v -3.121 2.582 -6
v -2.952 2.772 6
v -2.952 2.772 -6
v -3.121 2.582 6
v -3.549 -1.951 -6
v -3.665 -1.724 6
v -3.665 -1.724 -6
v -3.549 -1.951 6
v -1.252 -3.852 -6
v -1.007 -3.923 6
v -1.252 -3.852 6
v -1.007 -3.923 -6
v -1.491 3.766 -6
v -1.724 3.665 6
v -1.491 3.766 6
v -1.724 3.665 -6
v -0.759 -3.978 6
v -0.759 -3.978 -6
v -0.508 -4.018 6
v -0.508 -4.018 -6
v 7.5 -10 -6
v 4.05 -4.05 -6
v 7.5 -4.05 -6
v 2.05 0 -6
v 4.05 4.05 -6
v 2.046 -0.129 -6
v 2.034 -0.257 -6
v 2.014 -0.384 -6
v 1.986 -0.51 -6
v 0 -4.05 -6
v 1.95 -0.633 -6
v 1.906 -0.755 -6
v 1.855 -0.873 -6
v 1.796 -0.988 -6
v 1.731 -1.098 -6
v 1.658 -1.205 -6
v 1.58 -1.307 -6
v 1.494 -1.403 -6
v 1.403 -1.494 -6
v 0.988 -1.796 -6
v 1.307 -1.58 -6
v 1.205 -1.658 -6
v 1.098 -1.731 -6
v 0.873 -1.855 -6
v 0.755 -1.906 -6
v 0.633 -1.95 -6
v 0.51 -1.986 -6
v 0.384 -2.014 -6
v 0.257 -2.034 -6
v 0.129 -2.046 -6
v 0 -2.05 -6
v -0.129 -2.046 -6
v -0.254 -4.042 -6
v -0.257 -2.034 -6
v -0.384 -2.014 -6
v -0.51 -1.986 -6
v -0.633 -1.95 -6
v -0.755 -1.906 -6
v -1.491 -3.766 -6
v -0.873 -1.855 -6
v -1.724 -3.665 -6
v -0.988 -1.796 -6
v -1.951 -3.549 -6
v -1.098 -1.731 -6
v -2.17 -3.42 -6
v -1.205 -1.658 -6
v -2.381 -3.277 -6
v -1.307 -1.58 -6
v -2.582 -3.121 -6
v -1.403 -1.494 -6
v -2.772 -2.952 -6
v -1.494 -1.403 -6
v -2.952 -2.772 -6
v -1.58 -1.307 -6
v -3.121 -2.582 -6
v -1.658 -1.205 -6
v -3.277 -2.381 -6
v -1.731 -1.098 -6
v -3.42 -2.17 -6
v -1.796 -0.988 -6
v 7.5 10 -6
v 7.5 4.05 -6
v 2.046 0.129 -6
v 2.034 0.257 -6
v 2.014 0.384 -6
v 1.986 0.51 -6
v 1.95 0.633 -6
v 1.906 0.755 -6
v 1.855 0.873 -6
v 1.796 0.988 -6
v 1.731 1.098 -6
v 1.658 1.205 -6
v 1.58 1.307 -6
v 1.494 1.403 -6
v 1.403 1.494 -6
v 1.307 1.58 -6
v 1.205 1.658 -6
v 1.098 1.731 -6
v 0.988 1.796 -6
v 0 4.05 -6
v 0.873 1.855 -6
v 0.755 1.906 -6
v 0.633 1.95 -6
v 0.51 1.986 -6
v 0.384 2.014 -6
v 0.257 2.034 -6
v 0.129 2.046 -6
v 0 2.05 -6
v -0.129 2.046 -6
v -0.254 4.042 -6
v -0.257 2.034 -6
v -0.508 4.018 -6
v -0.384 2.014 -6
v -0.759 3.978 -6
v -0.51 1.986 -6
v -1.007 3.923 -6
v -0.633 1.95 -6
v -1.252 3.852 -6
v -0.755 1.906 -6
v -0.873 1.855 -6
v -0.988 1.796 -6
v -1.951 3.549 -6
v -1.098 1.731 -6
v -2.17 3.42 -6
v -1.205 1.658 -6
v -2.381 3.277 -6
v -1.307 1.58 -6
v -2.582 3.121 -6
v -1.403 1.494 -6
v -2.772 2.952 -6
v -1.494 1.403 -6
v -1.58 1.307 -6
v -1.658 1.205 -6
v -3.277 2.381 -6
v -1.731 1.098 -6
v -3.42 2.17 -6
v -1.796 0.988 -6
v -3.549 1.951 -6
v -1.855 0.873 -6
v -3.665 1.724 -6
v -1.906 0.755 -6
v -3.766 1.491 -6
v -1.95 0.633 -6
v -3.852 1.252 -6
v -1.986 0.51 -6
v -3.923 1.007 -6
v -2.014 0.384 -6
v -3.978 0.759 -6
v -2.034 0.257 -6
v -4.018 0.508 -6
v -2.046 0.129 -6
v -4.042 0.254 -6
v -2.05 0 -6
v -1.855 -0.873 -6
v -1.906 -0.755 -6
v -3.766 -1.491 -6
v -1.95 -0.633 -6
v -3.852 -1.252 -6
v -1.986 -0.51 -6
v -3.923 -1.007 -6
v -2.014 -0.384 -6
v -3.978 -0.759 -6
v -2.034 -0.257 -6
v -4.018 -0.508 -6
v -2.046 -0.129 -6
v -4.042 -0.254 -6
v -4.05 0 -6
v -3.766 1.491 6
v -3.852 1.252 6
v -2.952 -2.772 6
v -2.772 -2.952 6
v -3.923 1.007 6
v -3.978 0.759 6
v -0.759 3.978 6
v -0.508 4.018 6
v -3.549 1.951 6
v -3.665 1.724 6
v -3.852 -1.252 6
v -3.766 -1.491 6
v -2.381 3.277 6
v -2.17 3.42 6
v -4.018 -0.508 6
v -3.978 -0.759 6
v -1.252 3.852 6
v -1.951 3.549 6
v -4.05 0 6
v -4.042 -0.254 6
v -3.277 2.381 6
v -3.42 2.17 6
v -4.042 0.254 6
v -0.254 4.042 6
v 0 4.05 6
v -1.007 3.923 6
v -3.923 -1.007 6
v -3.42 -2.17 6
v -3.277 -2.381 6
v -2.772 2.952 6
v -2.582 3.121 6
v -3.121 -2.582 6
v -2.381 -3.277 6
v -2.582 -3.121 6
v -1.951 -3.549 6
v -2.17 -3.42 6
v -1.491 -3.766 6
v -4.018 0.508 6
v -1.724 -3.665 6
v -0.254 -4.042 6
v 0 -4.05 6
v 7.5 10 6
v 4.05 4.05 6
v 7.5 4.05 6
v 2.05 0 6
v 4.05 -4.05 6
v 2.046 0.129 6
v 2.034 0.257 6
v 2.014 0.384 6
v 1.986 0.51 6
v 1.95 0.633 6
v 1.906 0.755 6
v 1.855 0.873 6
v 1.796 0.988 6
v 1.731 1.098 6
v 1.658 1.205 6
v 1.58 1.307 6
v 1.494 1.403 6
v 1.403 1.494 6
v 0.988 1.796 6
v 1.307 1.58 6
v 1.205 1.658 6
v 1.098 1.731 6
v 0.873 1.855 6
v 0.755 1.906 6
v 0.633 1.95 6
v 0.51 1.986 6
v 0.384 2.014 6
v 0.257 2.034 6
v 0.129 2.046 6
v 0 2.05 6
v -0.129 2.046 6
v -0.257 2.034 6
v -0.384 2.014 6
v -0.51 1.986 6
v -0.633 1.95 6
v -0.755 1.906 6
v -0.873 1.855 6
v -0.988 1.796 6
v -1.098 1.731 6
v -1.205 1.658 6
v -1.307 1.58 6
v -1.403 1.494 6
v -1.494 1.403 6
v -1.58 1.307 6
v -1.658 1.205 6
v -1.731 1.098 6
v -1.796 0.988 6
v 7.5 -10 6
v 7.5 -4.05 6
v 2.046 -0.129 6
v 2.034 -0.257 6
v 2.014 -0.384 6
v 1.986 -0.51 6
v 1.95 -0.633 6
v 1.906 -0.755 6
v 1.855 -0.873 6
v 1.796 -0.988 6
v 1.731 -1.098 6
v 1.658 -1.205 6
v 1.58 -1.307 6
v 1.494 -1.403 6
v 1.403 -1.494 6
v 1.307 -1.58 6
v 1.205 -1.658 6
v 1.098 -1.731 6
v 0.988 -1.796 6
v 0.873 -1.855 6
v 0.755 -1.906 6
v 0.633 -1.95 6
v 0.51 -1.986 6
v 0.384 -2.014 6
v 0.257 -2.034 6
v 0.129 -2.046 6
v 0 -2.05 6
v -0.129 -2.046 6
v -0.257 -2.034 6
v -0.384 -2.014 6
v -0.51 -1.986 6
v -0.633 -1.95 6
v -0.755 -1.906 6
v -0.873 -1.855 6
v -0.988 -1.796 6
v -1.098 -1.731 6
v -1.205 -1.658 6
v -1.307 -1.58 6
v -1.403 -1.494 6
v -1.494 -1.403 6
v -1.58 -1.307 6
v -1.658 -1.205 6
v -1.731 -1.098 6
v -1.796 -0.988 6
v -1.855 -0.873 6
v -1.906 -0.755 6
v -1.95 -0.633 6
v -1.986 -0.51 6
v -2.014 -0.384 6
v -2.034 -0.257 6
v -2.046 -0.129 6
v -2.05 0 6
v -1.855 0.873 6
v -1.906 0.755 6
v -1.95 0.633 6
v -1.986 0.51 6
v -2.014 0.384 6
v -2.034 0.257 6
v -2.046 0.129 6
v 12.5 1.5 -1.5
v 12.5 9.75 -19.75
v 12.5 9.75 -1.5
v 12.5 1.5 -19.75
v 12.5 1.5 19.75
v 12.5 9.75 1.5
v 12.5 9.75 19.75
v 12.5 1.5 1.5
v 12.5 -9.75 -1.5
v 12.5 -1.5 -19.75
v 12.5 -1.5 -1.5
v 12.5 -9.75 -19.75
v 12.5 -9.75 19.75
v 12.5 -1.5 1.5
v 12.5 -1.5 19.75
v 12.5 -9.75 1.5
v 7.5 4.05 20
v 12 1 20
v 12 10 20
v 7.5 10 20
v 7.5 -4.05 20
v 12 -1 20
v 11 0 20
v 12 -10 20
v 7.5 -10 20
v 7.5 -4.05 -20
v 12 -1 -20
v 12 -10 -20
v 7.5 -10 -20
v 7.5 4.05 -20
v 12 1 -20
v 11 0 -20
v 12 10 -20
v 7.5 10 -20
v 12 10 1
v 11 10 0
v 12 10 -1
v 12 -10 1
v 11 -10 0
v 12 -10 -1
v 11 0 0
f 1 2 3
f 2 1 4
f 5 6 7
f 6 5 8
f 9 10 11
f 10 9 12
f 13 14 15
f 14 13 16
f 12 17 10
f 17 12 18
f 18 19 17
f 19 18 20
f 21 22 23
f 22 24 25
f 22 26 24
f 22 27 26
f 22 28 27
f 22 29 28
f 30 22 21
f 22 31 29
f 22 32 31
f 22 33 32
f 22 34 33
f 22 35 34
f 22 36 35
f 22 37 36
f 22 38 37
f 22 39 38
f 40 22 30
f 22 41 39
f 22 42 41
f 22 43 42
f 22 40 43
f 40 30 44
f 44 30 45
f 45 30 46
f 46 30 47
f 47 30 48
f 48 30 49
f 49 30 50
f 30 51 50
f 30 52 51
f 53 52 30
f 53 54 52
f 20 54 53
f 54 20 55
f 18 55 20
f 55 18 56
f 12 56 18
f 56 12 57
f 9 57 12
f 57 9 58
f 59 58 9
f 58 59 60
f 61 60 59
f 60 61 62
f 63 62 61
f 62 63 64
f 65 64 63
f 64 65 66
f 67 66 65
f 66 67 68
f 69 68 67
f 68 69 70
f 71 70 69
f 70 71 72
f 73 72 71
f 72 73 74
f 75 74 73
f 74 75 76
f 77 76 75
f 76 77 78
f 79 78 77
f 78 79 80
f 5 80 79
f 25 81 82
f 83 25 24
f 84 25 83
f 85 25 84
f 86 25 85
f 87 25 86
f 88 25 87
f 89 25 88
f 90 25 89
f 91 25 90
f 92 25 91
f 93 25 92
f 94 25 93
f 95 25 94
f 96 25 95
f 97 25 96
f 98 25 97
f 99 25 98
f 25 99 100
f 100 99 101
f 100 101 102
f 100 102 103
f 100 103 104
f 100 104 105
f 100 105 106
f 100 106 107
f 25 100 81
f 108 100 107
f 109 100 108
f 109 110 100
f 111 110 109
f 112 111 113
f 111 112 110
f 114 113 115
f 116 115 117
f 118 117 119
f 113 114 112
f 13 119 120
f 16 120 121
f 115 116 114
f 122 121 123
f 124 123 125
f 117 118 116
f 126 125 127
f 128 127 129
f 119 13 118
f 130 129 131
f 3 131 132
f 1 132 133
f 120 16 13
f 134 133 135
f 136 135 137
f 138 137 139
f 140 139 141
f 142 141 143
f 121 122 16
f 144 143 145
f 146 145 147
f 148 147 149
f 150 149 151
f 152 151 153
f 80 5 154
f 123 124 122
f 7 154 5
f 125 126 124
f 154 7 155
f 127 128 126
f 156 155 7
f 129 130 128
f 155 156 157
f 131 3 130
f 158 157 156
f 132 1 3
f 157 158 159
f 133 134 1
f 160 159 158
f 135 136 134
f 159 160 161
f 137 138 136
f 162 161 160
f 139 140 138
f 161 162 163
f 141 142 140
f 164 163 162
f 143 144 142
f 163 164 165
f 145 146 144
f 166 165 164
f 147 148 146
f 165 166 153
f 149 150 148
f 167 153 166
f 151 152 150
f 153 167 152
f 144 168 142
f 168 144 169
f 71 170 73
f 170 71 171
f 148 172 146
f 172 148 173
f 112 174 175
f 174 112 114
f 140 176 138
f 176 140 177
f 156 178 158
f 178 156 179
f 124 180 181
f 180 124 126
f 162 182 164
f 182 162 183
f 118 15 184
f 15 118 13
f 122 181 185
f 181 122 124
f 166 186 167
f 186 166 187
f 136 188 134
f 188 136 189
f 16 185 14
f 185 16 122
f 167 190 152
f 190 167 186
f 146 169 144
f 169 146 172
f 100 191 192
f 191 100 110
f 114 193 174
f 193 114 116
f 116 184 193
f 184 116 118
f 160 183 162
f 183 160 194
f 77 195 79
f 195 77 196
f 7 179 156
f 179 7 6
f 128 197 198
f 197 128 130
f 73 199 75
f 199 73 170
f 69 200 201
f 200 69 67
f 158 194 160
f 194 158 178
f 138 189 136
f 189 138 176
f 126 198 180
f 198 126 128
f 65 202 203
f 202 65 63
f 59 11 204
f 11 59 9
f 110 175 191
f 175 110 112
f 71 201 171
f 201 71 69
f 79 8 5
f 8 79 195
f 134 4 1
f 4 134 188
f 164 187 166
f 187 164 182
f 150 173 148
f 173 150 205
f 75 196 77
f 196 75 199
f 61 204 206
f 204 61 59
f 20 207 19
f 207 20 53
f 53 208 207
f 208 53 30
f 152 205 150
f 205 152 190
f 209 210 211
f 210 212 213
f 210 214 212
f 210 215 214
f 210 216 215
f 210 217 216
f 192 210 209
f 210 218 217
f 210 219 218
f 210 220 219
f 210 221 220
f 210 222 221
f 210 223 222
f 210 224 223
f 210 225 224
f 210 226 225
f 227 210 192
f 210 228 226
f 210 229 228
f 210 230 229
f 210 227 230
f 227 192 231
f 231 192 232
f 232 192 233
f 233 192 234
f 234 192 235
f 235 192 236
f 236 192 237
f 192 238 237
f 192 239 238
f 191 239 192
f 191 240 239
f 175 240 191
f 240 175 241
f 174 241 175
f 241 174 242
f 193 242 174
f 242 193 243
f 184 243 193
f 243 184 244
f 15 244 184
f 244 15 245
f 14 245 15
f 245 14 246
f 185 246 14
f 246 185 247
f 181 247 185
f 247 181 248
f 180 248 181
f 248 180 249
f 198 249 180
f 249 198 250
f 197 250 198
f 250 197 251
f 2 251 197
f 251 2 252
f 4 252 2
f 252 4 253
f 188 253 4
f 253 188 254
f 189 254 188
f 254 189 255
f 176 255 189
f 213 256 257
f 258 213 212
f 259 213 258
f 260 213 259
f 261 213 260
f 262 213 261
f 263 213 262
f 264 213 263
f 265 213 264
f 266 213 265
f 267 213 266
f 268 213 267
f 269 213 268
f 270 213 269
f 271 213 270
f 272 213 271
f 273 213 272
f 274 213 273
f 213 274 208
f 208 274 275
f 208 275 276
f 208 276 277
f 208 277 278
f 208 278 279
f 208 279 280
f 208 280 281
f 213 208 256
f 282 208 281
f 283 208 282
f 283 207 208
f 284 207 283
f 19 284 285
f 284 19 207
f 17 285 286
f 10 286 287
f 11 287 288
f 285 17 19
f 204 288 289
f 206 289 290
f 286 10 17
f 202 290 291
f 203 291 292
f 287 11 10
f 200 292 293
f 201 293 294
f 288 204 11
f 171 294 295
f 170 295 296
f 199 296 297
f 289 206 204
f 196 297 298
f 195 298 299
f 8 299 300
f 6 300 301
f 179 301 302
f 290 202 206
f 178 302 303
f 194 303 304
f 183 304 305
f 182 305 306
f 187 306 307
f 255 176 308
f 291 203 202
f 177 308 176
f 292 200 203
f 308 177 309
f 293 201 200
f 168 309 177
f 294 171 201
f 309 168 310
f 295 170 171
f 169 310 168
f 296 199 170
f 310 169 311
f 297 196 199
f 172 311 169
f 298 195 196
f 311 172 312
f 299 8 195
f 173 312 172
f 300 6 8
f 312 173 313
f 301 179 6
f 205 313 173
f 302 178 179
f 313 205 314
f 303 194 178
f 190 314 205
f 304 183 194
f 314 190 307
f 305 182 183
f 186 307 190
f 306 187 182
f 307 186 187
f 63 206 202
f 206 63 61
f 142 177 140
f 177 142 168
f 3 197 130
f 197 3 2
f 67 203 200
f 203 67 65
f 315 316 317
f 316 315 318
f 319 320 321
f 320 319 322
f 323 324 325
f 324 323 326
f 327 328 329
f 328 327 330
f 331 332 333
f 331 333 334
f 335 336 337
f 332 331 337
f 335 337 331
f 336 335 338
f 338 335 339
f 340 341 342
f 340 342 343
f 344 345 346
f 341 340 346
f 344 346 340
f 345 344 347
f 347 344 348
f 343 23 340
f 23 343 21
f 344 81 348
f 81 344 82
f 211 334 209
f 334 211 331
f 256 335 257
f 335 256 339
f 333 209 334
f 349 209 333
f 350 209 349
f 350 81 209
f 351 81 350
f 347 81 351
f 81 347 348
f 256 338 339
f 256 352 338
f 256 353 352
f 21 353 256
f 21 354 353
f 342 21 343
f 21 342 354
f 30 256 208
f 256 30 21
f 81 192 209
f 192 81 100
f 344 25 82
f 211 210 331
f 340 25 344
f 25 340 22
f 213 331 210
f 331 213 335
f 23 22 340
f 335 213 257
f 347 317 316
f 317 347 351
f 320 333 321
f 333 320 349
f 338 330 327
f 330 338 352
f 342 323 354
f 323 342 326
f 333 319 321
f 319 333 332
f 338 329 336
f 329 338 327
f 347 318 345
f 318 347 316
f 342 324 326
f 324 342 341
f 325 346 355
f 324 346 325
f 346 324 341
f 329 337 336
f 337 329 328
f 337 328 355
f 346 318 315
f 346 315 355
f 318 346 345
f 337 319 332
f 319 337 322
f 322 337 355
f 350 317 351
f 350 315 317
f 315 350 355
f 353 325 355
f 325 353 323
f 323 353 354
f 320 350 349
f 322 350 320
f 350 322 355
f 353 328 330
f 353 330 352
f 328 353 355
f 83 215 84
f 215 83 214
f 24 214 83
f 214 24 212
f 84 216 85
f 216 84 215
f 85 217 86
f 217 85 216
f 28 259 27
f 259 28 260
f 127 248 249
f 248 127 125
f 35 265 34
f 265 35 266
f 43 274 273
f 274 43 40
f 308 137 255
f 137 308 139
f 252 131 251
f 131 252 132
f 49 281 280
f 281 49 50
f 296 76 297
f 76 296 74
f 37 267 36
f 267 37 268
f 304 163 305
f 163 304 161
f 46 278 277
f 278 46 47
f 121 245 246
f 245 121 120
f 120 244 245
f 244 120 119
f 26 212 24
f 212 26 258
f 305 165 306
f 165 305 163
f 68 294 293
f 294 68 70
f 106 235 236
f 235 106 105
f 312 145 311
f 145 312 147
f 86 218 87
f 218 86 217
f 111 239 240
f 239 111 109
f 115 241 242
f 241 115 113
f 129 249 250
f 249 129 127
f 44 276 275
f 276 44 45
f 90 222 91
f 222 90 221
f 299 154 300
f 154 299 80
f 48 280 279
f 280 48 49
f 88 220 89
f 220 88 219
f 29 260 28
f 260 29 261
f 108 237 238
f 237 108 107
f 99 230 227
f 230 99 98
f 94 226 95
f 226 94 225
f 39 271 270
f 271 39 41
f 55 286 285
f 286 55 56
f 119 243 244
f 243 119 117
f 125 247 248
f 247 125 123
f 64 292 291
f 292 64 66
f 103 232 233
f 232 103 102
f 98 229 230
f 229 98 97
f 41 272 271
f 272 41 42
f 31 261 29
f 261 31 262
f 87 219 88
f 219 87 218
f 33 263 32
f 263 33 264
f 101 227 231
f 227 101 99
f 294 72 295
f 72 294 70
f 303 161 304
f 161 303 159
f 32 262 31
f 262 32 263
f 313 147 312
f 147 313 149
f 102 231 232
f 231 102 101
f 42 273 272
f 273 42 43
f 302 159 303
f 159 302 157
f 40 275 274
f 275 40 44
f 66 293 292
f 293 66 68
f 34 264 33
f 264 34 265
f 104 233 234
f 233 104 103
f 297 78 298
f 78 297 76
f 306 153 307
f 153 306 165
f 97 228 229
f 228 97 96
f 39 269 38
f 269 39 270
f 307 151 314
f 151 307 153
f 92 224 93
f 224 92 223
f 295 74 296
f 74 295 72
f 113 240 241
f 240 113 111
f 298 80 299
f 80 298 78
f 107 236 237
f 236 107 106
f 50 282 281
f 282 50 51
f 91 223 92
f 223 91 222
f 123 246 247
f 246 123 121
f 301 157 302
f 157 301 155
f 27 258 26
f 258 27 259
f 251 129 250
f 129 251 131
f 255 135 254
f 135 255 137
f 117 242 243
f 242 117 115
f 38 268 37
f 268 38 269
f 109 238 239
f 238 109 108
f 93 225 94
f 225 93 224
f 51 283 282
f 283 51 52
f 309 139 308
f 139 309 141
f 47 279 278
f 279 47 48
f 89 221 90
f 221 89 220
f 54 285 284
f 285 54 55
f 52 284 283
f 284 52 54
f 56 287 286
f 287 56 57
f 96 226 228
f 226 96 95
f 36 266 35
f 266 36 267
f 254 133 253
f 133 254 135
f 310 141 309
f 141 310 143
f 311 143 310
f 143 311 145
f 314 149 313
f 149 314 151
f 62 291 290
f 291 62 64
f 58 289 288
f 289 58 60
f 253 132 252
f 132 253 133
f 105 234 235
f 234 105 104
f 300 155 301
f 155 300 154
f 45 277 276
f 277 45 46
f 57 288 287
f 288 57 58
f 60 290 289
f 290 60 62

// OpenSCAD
/*
    Wolfcraft - Backen
    
    ein weiterer Versuch, eigene Backen für die Wolfkraft-Zwingen
    zu modellieren
    
    + Wolfcraft FZH 40 Ergo-Federzwinge 3626000

    Gedruckt mit 60% Füllung.
    
    nicht probiert:
      Wolfcraft FZ 40 Federzwinge 3630000
      Wolfcraft FZR30 Ratschenzwinge 3016000 
*/

$fn = $preview ? 20 : 100;


pindm = 3.9 + 0.2;      // Durchmesser des Pinlochs
pinbreite = 12.0;         // Breite des Pinzylinders
pinwandst = 2.0;         // Wandstärke des Pinlochs

backenbreite = 20.0;
backenlaenge = 40.0;
backendicke = 5.0;
backenoffset = 10.0;

// die beiden Stege
stegachse = true;          // ohne diesen macht es keinen Sinn!
stegquer = true;
mittelfase = true;          // die "Zentrierfase" in der Mitte, 45° ohne Stützstruktur

steg = [ 
    [0,-pindm/2.0-pinwandst],
    [0,+pindm/2.0+pinwandst],
    [backenoffset-backendicke/2.0,backenbreite/2.0],
    [backenoffset-backendicke/2.0,-backenbreite/2.0]
    ];
stegpkt = [[0,1,2,3]];

steif = [ 
    [pindm/2.0+pinwandst,-pinbreite/2.0],
    [pindm/2.0+pinwandst,+pinbreite/2.0],
    [backenoffset-backendicke/2.0,backenlaenge/2.0],
    [backenoffset-backendicke/2.0,-backenlaenge/2.0]
    ];
steifpkt = [[0,1,2,3]];

pofs = 0;
pgrid = 0.5;
p45 = [[0,0],[-pgrid,0],[pgrid,-pgrid]];
pp45 = [[0,1,2]];

// die Mittelfase
nutgrid = 1.5;
nut45 = [[-nutgrid,0],[0,nutgrid],[0,-nutgrid]];
nnut45 = [[0,1,2]];


difference() {
    union() {
        cylinder(h=pinbreite,d=pindm+2*pinwandst, center=true);
        
        color("red")
        translate([backenoffset,0,0])
        cube([backendicke,backenbreite,backenlaenge], center=true);
        
        // der Steg in Achsenausrichtung
        if (stegachse) {
            color("blue")
            linear_extrude(height=pinbreite, center = true, 
                                   convexity = 10, twist = 0)
            polygon(steg,stegpkt);
        }
        
        // der Steg in Querrichtung
        if (stegquer) {
        color("green")
            rotate([90,0,0])
            linear_extrude(height=pindm+2.0*pinwandst, center = true, 
                                   convexity = 10, twist = 0)
            polygon(steif,steifpkt);
        }
    }
    
    union() {
        cylinder(h=pinbreite,d=pindm, center=true);
        
        // Fußphasen aussen, Anti-"Elefantenfuß"
        color("pink") {
            translate([backendicke/2.0+backenoffset+pofs,backenbreite/2.0-pofs,0])
            linear_extrude(height = backenlaenge, center = true, convexity = 10, twist = 0)
            polygon(p45,pp45);
            
            rotate([180,0,0])
            translate([backendicke/2.0+backenoffset+pofs,backenbreite/2.0-pofs,0])
            linear_extrude(height = backenlaenge, center = true, convexity = 10, twist = 0)
            polygon(p45,pp45);
            
            rotate([90,0,0])
            translate([backendicke/2.0+backenoffset+pofs,backenlaenge/2.0-pofs,0])
            linear_extrude(height = backenbreite, center = true, convexity = 10, twist = 0)
            polygon(p45,pp45);
            
            rotate([270,0,0])
            translate([backendicke/2.0+backenoffset+pofs,backenlaenge/2.0-pofs,0])
            linear_extrude(height = backenbreite, center = true, convexity = 10, twist = 0)
            polygon(p45,pp45);
        }

        // Fußphasen aussen, Anti-"Elefantenfuß"
        if (mittelfase) {
            color("white") {
                translate([backendicke/2.0+backenoffset,0,0])
                linear_extrude(height = backenlaenge, center = true, convexity = 10, twist = 0)
                polygon(nut45,nnut45);
                
                rotate([90,0,0])
                translate([backendicke/2.0+backenoffset,0,0])
                linear_extrude(height = backenbreite, center = true, convexity = 10, twist = 0)
                polygon(nut45,nnut45);
            }
        }        
    }
}
